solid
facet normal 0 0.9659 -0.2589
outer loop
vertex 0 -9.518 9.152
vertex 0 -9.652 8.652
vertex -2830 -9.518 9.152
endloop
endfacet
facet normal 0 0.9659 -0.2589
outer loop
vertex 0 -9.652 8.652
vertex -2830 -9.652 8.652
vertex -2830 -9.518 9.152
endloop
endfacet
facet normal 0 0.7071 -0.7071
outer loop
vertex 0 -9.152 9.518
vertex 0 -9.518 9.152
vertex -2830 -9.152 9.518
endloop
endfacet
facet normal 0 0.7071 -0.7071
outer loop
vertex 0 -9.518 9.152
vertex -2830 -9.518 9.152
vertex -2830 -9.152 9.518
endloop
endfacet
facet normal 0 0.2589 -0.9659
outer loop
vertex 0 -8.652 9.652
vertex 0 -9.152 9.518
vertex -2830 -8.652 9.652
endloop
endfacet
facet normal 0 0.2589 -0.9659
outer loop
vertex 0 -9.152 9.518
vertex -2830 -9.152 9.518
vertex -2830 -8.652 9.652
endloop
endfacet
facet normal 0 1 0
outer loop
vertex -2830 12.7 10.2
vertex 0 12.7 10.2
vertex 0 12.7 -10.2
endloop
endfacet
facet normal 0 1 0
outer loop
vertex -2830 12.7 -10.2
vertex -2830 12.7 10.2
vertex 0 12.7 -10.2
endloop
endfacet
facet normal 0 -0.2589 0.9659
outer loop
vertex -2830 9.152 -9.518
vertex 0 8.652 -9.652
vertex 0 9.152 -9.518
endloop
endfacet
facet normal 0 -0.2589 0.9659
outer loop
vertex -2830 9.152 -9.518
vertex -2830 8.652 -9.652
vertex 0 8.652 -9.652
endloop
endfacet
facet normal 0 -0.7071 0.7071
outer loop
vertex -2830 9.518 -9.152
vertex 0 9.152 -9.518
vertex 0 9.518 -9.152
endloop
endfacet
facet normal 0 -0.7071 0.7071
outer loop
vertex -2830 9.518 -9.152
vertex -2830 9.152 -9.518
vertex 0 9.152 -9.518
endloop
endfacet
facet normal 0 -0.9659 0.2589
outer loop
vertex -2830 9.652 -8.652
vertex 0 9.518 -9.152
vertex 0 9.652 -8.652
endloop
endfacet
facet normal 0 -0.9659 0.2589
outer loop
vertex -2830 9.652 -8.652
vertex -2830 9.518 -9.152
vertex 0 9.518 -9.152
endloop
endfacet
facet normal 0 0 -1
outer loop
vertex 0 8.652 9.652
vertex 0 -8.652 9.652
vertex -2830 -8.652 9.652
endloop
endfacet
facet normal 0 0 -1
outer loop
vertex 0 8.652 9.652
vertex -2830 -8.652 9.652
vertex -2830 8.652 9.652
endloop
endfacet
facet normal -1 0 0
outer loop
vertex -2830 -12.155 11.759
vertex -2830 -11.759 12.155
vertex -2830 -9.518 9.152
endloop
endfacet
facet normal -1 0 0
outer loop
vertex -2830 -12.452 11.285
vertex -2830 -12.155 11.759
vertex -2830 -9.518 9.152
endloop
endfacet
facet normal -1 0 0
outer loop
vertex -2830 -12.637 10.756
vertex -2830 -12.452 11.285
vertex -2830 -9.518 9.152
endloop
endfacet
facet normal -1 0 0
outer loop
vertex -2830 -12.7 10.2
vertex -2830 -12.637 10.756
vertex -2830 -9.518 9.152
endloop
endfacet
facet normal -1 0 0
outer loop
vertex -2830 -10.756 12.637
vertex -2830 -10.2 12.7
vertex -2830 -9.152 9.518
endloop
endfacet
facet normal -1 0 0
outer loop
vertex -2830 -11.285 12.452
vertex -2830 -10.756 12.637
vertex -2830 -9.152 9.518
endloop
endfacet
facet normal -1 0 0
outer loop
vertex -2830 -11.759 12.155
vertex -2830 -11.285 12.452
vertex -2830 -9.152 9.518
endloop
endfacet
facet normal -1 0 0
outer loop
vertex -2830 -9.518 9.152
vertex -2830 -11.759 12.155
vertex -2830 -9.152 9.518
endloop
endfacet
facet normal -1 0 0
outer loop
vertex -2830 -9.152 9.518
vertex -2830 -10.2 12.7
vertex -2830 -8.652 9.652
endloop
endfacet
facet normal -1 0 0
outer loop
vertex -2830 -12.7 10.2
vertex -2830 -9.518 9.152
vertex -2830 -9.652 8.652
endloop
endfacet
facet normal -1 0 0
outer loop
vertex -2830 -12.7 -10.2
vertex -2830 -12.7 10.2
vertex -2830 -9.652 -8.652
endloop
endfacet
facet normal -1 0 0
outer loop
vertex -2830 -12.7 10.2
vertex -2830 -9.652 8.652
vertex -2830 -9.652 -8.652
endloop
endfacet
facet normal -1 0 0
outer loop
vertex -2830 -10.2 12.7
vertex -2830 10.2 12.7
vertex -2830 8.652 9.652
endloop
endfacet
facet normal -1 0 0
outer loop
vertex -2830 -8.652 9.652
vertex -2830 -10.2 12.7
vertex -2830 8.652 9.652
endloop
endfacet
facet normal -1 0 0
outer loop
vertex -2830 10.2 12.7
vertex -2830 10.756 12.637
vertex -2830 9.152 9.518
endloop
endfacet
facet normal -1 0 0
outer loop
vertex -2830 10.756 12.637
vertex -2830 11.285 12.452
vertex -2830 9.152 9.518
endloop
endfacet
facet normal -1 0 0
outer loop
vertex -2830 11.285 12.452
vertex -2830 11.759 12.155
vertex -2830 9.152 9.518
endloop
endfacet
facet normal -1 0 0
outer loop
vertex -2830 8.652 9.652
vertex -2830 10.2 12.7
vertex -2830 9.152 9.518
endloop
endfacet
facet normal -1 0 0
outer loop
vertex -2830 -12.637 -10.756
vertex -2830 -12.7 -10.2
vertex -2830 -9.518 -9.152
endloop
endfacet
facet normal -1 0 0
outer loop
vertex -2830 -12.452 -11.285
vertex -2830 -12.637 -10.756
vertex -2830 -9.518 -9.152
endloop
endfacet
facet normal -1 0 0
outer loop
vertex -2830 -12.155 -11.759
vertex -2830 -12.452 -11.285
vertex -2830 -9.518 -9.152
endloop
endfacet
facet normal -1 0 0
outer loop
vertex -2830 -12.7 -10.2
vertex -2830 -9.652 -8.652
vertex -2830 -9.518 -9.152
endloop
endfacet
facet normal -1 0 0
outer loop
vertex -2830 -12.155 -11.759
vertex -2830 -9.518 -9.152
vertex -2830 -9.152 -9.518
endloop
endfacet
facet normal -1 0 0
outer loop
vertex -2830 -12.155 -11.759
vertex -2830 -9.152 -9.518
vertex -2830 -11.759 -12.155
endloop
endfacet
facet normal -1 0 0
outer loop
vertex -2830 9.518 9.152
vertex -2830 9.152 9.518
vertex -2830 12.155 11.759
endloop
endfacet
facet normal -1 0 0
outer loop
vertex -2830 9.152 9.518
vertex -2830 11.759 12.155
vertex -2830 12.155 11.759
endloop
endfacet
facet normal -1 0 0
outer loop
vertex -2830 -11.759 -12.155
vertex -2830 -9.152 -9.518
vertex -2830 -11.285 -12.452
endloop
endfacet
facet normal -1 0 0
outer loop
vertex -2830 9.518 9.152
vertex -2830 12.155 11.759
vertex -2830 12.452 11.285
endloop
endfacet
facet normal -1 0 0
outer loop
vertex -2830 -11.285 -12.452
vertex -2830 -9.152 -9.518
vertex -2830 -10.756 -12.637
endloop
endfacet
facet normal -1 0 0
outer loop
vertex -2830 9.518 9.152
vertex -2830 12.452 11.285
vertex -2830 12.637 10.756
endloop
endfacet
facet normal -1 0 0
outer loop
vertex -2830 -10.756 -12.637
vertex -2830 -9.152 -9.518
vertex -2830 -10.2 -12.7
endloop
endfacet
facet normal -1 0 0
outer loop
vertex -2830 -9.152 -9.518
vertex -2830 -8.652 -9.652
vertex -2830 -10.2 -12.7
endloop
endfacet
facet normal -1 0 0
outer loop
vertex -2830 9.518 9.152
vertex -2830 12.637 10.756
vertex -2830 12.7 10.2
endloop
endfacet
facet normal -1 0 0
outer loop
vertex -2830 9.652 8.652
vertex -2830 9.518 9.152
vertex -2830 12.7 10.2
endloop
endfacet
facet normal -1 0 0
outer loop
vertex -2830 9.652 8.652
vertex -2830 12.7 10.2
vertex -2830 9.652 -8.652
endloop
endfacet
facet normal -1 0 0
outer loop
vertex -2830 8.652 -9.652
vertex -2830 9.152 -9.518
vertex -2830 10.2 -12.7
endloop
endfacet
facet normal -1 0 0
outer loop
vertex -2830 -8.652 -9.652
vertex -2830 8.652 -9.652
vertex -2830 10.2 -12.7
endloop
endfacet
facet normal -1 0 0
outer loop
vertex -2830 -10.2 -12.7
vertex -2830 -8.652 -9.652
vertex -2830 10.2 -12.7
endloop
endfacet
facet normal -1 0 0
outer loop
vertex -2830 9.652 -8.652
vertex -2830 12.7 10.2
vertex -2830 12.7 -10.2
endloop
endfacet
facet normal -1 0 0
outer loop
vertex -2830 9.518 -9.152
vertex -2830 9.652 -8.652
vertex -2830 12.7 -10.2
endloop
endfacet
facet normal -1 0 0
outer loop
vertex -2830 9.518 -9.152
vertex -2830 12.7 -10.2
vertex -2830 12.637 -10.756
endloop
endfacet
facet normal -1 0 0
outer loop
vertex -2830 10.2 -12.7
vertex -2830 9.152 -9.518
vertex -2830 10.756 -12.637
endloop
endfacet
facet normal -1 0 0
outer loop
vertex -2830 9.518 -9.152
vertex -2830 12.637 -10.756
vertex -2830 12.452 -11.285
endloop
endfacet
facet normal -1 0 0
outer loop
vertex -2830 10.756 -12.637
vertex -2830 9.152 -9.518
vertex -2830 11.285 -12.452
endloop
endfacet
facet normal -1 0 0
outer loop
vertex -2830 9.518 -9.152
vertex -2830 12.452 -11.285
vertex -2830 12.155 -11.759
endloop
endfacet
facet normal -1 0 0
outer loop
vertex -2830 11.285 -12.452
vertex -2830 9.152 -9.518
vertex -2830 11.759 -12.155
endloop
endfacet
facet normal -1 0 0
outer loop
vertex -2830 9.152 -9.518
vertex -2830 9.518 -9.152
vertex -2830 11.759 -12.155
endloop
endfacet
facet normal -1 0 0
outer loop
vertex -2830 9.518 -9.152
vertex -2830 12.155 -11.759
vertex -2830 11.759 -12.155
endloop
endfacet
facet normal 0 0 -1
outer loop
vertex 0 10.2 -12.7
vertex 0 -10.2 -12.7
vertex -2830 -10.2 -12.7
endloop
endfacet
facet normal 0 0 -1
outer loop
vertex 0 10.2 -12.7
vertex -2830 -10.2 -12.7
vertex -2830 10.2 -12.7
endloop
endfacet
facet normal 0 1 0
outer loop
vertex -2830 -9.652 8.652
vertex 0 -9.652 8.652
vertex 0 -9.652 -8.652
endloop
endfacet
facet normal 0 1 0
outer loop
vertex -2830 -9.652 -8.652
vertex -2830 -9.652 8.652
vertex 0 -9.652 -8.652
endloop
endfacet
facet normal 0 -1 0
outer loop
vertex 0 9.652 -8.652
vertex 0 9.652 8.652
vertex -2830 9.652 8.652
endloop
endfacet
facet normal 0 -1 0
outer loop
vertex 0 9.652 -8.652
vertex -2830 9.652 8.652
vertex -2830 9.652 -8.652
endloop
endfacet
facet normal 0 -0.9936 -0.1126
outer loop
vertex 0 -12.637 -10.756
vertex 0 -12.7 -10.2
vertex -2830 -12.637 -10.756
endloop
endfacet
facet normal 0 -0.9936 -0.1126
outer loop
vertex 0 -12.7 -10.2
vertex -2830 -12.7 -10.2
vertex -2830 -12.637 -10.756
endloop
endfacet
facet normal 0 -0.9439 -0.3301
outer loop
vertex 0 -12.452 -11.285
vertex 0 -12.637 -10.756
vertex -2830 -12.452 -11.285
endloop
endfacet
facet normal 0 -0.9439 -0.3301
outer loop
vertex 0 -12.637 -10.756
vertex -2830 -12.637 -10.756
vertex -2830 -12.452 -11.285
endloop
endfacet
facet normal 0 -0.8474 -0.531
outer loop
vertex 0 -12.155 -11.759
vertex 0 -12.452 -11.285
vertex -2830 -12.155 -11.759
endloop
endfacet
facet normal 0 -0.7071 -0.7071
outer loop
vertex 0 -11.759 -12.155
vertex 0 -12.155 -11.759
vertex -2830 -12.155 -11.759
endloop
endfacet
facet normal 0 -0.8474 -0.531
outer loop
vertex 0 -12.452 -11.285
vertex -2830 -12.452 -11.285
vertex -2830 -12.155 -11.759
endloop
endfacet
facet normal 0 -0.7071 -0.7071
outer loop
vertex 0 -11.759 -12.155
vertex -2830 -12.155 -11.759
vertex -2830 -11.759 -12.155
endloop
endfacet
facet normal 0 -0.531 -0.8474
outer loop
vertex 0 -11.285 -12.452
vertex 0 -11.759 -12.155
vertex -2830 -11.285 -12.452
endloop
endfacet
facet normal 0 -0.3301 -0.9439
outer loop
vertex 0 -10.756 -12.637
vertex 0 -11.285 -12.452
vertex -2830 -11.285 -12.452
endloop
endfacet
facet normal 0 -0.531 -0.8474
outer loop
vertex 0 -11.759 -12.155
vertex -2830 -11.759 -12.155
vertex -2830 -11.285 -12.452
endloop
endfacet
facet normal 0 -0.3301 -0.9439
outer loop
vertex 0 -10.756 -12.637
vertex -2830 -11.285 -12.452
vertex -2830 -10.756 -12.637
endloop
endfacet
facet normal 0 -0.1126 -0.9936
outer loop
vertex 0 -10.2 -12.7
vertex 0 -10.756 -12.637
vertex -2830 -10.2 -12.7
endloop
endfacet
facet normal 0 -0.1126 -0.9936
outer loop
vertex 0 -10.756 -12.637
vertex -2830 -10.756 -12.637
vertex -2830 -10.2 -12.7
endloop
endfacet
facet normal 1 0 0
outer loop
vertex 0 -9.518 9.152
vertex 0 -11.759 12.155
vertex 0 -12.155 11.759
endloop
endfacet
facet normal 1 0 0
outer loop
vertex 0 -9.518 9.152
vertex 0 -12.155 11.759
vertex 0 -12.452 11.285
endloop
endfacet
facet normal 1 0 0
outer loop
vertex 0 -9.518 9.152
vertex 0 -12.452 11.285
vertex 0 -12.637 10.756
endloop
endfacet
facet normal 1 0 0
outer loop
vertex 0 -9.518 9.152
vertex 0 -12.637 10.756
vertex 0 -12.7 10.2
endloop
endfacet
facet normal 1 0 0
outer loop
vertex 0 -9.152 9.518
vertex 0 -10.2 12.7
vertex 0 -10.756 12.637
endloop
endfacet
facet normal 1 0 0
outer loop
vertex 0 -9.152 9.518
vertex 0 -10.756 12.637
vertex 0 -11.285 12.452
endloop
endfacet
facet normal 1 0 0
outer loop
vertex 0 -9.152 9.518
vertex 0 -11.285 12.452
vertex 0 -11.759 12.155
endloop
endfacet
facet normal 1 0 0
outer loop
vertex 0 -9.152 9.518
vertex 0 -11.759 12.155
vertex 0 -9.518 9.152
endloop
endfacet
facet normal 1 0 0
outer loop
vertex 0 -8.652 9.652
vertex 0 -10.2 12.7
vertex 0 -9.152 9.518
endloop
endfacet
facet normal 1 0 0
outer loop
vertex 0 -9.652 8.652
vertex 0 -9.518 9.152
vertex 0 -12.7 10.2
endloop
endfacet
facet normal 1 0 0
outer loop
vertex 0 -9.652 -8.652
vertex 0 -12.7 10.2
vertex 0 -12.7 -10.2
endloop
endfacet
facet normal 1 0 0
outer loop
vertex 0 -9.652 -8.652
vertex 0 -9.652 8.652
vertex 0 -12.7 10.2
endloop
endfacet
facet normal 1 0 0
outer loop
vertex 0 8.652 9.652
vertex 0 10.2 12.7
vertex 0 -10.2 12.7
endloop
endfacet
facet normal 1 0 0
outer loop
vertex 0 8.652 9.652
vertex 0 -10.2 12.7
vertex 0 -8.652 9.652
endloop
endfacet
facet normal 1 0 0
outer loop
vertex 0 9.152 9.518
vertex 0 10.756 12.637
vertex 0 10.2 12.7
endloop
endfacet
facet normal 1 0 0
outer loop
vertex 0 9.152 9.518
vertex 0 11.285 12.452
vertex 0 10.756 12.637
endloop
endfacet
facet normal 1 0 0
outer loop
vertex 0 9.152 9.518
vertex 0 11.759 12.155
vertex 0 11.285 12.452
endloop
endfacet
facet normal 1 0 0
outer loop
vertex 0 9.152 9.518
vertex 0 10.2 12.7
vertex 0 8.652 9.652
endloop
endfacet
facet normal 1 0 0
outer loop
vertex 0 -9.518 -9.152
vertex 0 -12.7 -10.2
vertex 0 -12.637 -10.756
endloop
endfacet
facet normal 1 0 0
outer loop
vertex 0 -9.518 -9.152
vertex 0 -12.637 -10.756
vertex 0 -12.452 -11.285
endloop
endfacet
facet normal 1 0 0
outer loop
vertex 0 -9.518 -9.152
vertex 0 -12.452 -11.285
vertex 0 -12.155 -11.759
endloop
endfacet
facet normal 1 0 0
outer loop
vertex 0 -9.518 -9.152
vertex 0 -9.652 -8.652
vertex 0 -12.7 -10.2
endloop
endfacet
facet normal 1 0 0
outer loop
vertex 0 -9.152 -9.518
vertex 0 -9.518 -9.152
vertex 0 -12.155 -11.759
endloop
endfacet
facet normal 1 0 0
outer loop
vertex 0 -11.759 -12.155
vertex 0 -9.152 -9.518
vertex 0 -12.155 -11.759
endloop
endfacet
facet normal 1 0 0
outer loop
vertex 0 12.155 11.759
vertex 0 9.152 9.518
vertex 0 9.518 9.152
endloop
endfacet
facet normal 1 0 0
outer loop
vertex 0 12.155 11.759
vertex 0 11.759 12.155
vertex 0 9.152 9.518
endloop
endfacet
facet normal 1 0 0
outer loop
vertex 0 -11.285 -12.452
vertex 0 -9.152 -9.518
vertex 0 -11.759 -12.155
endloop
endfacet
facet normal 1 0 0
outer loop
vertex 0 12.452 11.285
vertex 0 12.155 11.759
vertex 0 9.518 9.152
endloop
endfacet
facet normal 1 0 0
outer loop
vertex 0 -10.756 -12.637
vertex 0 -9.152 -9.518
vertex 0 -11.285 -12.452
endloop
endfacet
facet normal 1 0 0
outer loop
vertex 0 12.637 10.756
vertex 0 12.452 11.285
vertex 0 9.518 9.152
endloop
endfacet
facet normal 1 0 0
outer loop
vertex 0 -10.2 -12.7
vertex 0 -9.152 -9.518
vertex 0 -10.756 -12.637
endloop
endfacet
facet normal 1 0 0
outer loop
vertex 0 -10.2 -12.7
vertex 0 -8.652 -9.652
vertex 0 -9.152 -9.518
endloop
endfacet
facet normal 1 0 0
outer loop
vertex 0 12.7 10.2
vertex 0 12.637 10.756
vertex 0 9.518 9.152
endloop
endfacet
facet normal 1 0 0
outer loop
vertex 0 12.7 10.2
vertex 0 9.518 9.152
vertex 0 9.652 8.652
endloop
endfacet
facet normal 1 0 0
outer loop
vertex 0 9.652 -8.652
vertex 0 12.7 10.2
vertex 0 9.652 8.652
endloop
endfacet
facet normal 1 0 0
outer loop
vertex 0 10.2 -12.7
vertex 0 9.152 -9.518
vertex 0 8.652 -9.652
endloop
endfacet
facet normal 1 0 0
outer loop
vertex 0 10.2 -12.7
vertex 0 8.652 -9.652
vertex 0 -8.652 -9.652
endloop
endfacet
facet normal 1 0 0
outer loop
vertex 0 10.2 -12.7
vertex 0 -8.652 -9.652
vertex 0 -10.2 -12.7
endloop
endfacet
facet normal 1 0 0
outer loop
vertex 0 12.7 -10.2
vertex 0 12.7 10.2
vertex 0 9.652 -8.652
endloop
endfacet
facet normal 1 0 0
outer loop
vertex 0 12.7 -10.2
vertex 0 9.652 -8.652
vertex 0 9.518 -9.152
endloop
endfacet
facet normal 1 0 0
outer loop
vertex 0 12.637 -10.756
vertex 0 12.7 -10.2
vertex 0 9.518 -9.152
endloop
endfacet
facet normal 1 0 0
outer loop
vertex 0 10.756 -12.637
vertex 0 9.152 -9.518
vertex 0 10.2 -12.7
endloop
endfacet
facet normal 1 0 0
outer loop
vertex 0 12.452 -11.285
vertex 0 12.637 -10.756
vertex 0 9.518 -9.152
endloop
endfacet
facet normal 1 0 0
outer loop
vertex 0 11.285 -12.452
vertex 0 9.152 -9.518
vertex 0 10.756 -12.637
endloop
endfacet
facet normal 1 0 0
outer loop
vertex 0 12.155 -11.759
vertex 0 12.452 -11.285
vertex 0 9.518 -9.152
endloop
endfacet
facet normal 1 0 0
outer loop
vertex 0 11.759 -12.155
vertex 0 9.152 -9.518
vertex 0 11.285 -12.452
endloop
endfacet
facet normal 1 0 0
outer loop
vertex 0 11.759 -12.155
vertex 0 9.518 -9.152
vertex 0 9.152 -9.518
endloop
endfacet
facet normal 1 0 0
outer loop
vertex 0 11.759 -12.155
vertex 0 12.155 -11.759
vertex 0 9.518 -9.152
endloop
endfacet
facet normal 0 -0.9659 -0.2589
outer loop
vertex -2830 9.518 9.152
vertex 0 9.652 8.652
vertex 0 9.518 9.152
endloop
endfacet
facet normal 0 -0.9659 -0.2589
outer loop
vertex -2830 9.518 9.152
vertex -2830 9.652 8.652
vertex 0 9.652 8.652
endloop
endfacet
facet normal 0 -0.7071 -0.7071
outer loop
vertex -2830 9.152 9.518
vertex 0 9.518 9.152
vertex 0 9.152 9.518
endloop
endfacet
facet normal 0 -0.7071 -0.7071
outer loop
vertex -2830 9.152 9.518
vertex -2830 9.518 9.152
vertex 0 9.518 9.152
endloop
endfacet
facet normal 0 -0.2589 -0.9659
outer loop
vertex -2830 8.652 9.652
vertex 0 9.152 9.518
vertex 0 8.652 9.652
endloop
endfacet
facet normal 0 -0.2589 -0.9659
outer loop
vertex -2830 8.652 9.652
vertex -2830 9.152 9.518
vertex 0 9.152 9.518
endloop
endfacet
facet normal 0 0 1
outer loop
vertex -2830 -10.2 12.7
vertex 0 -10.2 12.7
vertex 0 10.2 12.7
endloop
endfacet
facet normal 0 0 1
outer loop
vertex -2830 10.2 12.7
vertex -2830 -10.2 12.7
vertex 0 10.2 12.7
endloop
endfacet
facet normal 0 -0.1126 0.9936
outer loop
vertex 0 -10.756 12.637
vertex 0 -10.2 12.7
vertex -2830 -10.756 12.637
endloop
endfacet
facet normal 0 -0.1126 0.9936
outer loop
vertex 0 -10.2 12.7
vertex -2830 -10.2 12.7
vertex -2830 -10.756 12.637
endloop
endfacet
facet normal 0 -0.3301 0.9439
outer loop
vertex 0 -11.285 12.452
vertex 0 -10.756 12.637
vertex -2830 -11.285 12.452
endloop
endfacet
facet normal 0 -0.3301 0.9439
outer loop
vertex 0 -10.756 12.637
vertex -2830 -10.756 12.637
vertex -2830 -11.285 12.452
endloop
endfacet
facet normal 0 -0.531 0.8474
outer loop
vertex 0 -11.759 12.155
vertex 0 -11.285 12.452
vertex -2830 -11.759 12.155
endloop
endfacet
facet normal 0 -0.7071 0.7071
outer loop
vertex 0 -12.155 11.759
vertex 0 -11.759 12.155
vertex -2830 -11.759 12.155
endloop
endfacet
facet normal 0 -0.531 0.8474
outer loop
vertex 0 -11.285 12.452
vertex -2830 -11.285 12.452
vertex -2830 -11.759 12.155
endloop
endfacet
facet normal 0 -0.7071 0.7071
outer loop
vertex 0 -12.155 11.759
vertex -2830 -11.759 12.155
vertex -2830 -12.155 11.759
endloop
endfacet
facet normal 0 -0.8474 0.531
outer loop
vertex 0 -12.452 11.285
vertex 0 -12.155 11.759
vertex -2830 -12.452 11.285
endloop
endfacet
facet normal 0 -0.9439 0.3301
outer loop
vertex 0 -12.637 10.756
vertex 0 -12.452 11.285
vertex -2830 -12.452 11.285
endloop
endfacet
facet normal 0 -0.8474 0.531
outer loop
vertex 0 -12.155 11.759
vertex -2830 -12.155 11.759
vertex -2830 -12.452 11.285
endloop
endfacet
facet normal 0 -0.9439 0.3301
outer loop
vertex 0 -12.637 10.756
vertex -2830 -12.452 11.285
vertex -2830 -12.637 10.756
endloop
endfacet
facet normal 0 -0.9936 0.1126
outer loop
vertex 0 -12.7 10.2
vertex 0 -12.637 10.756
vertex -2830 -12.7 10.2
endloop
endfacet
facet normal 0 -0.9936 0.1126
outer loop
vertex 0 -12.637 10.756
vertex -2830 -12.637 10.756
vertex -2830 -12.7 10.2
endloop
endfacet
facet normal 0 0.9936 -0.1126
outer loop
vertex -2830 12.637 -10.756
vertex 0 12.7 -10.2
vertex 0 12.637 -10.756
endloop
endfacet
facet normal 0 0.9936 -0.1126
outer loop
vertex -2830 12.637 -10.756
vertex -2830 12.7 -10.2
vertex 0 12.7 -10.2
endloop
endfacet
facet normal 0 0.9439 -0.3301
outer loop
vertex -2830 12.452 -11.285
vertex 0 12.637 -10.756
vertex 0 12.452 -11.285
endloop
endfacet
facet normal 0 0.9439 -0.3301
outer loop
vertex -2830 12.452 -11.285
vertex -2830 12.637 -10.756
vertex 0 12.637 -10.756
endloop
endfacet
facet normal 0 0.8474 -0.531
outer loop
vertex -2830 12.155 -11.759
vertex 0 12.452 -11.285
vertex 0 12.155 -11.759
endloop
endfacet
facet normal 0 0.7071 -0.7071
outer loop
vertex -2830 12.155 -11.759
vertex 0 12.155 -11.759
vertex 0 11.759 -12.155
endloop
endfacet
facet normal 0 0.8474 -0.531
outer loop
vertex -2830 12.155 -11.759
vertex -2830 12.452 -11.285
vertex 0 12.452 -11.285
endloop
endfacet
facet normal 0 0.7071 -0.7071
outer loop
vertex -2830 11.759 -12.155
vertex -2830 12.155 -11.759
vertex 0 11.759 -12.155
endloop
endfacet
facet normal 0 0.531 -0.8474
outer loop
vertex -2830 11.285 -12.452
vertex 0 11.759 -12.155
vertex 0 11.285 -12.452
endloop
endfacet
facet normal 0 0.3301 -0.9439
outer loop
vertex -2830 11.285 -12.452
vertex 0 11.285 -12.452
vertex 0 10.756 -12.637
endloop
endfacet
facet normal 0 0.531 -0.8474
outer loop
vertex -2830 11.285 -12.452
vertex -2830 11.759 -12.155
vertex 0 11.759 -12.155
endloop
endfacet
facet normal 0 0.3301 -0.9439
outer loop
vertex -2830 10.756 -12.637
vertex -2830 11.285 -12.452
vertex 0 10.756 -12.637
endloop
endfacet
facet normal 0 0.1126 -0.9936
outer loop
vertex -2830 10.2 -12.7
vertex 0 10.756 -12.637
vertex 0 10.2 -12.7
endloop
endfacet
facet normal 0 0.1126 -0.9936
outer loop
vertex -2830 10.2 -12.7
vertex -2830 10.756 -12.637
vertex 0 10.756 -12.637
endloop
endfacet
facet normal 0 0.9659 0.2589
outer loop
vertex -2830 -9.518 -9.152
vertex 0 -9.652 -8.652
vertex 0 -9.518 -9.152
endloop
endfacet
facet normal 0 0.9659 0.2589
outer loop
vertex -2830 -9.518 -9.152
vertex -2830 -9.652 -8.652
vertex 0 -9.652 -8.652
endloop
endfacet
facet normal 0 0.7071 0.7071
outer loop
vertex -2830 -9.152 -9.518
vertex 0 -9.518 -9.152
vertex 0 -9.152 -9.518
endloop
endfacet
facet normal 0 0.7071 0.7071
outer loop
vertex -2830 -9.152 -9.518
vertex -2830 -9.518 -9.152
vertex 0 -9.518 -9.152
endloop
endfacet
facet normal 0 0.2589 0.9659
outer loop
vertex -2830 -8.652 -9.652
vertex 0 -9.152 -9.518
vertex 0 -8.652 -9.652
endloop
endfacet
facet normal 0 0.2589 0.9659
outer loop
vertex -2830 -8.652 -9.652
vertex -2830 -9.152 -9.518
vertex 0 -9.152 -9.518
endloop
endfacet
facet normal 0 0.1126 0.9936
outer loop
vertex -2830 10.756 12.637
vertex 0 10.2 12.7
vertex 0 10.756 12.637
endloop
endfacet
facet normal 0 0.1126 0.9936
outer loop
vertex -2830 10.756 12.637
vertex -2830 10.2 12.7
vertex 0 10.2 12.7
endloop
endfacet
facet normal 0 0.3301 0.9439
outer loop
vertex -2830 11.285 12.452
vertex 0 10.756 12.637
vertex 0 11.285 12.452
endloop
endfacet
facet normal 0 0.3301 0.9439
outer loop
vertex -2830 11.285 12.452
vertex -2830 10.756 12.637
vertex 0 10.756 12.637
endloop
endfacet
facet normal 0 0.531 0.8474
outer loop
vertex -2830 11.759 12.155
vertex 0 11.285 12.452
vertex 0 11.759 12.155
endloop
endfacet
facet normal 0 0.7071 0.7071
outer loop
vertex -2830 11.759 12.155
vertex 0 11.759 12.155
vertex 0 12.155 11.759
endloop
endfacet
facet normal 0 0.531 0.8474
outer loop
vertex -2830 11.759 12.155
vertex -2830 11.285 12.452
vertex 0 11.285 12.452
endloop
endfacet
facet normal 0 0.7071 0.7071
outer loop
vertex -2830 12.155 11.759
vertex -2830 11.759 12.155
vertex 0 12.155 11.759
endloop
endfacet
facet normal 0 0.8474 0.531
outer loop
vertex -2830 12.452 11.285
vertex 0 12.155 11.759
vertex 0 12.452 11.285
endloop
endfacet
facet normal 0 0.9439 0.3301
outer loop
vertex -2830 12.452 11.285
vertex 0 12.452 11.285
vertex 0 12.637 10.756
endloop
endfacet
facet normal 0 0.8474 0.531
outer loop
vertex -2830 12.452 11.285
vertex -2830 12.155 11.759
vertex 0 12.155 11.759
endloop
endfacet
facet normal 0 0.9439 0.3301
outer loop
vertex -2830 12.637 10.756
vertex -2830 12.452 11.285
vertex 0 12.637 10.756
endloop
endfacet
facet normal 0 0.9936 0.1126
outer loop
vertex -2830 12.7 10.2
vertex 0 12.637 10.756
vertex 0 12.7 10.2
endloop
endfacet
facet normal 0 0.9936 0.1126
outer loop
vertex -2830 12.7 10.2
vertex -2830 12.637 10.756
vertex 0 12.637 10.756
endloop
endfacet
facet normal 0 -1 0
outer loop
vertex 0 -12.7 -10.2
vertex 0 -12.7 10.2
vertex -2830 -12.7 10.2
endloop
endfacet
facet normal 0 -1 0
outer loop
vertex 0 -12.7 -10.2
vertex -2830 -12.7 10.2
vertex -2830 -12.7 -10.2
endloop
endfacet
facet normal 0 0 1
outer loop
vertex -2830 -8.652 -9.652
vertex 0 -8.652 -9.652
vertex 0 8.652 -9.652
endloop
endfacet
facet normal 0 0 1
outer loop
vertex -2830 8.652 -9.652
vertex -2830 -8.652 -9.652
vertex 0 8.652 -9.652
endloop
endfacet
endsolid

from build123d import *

# Parameters (mm, degrees)
SKETCH3_W           = 25.4
SKETCH3_H           = 25.4
SKETCH3_W_2         = 19.304
SKETCH3_H_2         = 19.304
BOSS_EXTRUDE1_DEPTH = 2830
FILLET1_R           = 2.5
FILLET2_R           = 1


with BuildPart() as part:
    # Sketch3 → Boss-Extrude1 (new body)
    with BuildSketch(Plane(origin=(0, 0, 0), x_dir=(0, 0, -1), z_dir=(1, 0, 0))):
        Rectangle(SKETCH3_W, SKETCH3_H)
        Rectangle(SKETCH3_W_2, SKETCH3_H_2, mode=Mode.SUBTRACT)
    extrude(amount=-BOSS_EXTRUDE1_DEPTH)

    # Fillet1
    fillet1_edges = [part.edges().sort_by_distance(p)[0] for p in [
        (-1415, -12.7, -12.7),
        (-1415, -12.7, 12.7),
        (-1415, 12.7, 12.7),
        (-1415, 12.7, -12.7),
    ]]
    fillet(fillet1_edges, radius=FILLET1_R)

    # Fillet2
    fillet2_edges = [part.edges().sort_by_distance(p)[0] for p in [
        (-1415, 9.652, -9.652),
        (-1415, -9.652, -9.652),
        (-1415, -9.652, 9.652),
        (-1415, 9.652, 9.652),
    ]]
    fillet(fillet2_edges, radius=FILLET2_R)


solid = part.part
